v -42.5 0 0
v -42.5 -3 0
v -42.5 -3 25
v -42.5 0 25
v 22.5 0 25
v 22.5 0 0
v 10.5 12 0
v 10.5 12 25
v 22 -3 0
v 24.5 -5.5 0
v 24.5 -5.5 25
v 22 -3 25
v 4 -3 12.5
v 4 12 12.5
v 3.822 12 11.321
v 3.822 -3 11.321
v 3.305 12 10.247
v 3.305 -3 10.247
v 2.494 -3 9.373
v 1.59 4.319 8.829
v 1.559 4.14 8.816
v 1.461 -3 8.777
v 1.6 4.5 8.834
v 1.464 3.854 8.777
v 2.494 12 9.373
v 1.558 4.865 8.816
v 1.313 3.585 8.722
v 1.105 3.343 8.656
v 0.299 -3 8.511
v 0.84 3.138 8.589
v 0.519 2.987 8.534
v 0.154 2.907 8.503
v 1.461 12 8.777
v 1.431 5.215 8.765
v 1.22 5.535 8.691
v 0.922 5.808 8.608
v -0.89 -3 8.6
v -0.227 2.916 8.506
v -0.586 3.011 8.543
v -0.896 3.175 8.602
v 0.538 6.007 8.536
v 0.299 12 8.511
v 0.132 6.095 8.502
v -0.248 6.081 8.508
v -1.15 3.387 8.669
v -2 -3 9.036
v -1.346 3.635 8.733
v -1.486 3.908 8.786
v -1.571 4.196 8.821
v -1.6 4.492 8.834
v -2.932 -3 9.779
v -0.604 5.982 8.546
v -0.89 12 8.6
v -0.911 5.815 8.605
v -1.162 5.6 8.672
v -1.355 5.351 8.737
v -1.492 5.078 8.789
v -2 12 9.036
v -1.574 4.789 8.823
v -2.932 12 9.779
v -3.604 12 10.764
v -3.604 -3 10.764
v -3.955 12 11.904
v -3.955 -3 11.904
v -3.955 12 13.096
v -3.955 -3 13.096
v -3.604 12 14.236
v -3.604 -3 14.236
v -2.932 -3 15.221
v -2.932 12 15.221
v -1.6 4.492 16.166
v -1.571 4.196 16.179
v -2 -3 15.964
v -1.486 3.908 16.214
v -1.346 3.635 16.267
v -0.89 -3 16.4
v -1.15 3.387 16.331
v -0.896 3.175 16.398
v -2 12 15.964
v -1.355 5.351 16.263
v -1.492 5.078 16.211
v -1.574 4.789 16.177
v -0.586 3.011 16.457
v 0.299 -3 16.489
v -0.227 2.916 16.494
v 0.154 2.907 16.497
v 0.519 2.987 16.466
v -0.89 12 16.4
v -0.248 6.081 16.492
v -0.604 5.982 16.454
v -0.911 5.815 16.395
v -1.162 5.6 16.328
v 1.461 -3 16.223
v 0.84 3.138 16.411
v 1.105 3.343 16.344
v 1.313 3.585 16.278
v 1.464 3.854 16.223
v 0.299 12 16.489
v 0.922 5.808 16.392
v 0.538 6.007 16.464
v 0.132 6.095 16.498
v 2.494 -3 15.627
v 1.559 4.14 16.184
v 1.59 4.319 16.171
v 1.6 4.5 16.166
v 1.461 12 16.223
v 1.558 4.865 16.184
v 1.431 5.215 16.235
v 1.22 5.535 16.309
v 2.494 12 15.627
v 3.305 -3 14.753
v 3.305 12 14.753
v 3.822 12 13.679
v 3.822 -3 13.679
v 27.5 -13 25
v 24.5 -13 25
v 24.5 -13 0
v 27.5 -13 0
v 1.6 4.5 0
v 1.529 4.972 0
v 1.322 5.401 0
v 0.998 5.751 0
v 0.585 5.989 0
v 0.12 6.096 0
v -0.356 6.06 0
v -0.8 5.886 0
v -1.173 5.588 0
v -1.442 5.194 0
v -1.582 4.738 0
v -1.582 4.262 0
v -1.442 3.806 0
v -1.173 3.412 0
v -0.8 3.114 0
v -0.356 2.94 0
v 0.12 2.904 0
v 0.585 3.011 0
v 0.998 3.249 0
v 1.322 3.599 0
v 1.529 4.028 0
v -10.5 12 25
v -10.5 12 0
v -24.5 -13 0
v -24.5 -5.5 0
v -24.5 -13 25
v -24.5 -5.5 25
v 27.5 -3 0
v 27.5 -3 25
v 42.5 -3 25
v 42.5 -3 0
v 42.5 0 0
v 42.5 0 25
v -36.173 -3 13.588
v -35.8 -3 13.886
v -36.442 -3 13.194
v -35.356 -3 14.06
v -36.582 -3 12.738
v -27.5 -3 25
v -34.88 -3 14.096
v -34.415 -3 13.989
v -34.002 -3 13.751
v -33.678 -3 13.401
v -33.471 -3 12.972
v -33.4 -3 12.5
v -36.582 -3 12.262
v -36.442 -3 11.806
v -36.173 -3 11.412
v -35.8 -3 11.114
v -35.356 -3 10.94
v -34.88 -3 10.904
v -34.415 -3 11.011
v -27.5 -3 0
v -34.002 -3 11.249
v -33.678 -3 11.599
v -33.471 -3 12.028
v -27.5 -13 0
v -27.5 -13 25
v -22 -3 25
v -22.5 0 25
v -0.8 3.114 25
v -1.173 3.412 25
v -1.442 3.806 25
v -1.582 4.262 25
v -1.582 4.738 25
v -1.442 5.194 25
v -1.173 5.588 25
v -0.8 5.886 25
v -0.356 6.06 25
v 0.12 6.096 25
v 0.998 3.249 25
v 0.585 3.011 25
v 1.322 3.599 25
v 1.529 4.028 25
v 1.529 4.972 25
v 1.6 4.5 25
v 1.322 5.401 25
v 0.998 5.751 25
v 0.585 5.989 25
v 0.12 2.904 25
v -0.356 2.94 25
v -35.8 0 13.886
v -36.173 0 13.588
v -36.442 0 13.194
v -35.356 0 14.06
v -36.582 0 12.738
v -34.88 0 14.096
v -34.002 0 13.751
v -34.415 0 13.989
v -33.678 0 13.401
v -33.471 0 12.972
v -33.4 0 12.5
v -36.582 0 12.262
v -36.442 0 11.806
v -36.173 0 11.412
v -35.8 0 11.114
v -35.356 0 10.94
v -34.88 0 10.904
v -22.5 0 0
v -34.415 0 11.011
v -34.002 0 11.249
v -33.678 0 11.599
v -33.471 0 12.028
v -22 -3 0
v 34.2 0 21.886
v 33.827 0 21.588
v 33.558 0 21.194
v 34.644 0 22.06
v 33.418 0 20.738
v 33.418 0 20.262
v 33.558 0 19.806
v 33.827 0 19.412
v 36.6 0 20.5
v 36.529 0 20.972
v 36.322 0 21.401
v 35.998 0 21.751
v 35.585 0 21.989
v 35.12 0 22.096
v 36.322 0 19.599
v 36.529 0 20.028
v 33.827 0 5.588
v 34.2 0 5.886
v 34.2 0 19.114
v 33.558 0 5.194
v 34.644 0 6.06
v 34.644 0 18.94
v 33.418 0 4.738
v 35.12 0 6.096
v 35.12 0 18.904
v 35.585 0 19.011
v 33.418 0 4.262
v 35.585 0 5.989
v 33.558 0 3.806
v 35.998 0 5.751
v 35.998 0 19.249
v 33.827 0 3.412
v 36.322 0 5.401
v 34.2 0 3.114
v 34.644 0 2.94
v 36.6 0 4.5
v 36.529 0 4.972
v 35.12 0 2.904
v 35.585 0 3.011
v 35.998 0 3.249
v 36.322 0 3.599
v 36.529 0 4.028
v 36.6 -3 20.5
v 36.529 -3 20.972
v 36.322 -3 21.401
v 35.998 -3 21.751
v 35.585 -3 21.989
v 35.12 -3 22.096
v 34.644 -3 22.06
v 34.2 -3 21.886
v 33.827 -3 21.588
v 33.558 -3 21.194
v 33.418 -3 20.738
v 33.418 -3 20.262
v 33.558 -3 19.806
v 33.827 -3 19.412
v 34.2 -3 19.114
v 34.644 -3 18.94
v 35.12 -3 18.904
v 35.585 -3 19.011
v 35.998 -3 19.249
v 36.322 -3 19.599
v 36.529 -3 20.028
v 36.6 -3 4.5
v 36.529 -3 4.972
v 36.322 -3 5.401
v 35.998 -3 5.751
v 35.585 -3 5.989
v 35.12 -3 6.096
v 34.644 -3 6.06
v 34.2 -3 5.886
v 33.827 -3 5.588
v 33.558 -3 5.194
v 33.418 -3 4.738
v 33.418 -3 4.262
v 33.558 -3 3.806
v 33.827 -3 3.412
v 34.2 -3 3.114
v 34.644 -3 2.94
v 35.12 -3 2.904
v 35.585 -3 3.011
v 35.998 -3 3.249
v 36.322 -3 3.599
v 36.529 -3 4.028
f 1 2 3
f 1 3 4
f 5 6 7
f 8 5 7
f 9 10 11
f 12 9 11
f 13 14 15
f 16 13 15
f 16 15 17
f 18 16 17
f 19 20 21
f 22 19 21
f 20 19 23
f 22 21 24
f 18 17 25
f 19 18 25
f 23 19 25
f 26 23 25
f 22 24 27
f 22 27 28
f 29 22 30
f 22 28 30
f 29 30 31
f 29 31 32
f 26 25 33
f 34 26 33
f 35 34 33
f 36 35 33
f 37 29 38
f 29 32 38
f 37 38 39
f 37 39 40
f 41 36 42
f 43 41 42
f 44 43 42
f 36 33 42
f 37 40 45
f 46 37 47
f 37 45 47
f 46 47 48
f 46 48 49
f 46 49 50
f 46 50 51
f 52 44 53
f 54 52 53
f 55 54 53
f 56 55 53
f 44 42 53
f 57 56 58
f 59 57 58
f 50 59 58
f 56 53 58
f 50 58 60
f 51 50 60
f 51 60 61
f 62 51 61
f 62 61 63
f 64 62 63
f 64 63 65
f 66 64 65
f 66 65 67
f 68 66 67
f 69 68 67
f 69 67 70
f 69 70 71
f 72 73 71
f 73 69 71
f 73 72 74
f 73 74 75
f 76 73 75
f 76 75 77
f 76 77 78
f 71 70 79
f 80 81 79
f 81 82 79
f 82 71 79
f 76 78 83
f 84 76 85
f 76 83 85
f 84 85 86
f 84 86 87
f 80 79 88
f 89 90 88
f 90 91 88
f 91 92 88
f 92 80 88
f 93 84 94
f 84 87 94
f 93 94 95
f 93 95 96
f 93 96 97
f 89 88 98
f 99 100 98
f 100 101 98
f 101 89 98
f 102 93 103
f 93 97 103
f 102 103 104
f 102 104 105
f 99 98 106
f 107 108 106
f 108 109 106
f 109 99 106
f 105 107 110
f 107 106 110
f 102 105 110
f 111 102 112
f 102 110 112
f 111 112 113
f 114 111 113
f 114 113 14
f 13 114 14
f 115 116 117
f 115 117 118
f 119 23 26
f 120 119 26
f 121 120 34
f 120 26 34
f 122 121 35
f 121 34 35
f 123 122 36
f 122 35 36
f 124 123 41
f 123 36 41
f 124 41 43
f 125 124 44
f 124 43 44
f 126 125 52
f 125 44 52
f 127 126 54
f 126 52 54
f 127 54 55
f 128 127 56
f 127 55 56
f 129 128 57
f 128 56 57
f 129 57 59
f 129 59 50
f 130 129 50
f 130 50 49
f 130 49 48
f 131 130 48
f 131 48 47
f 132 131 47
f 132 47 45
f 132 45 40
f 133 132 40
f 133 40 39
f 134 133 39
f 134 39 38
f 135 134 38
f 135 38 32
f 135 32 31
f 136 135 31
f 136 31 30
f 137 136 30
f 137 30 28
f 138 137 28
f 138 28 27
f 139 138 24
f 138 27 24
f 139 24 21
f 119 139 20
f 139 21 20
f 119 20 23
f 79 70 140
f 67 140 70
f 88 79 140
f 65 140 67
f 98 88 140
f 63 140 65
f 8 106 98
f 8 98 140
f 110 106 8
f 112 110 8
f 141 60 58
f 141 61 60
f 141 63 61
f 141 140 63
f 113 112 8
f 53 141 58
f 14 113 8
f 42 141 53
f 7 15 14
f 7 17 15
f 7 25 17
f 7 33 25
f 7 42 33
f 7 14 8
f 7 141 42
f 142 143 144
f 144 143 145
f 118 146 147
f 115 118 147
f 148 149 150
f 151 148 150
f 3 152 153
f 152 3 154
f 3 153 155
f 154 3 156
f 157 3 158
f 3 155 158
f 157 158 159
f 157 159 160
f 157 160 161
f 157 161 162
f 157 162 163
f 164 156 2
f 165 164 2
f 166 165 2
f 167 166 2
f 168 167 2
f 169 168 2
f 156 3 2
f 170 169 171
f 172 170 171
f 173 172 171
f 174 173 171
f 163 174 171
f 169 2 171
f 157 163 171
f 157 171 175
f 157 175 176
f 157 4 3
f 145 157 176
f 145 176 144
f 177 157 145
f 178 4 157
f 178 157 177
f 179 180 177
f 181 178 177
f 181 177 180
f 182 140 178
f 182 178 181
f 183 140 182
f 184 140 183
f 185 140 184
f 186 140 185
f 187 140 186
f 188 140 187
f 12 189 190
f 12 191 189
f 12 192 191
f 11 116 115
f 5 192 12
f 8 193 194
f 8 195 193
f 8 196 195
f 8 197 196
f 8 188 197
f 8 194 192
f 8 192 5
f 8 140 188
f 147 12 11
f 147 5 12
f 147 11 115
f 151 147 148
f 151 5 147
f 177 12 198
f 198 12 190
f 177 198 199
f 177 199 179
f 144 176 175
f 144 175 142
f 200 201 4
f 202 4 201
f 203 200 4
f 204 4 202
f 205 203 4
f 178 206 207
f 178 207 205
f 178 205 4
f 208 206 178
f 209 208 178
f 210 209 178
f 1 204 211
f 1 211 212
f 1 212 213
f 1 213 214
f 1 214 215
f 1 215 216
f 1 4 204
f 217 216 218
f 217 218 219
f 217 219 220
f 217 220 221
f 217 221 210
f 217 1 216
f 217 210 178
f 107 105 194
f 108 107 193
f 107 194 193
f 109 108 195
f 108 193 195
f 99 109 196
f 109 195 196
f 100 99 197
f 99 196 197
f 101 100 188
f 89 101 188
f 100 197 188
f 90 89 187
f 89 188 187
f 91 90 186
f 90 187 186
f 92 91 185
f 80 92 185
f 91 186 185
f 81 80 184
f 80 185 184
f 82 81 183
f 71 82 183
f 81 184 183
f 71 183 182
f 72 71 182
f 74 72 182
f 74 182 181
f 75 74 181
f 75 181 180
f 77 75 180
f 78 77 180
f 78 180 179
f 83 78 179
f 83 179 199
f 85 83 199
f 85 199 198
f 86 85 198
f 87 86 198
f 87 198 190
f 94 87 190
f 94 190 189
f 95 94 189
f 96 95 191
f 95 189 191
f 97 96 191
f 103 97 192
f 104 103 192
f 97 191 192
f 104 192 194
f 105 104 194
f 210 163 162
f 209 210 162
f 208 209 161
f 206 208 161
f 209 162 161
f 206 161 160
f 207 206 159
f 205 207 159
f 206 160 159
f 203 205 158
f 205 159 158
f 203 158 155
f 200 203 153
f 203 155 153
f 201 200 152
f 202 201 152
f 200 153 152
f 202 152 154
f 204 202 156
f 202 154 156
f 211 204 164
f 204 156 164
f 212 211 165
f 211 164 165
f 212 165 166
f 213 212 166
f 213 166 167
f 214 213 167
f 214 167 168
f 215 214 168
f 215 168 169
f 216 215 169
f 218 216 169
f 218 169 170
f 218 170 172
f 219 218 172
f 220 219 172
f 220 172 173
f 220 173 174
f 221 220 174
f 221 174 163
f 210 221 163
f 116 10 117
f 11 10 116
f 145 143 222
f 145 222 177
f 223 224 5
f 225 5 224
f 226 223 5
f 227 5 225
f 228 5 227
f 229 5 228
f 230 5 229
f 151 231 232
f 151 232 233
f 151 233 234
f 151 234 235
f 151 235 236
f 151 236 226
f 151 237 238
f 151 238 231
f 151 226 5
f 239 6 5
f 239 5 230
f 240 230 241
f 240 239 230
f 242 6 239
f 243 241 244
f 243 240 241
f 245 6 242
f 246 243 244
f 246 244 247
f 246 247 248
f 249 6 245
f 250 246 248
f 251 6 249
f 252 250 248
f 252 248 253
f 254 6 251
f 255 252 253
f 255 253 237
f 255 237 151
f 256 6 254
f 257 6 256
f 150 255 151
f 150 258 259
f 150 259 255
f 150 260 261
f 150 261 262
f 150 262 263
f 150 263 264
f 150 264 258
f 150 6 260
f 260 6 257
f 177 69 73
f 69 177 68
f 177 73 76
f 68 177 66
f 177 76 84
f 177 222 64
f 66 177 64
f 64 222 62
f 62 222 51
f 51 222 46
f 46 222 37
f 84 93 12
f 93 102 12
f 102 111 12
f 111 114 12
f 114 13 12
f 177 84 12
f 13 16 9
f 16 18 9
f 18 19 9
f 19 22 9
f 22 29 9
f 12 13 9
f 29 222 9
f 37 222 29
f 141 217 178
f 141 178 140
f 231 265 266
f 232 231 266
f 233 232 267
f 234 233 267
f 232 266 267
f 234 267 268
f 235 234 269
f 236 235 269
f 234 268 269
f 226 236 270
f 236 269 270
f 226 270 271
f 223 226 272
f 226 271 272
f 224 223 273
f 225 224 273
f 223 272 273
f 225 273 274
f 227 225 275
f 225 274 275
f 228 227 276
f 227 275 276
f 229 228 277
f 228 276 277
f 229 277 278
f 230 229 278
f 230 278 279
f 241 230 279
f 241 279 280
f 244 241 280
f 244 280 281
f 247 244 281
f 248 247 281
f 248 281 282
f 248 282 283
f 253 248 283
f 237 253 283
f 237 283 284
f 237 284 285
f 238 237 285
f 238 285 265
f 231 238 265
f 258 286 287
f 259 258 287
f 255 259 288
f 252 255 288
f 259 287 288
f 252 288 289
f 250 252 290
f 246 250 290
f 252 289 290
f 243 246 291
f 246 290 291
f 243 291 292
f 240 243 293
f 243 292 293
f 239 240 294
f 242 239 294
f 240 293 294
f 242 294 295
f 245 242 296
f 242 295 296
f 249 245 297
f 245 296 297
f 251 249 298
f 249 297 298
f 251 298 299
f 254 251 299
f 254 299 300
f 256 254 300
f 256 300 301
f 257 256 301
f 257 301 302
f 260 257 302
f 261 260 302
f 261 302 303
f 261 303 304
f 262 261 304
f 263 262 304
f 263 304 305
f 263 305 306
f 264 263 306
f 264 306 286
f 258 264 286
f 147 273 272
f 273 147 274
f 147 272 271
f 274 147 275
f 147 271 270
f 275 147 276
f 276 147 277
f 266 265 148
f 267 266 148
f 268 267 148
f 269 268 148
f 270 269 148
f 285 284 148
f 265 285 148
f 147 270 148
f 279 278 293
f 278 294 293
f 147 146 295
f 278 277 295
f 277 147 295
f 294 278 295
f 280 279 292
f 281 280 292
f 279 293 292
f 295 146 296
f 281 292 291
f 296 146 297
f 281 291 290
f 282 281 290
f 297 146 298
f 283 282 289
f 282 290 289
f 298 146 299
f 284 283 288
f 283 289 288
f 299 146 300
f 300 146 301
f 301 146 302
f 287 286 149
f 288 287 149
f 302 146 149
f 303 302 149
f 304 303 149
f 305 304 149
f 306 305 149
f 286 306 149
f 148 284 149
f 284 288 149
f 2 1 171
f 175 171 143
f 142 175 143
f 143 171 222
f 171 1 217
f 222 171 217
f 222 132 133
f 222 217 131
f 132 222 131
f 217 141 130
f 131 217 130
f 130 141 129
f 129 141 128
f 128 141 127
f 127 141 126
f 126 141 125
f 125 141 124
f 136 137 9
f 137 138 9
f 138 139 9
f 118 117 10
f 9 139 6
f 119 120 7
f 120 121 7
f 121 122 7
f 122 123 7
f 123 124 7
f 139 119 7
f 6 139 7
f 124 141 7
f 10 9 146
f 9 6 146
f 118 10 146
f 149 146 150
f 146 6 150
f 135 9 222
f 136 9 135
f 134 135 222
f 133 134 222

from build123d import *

# Parameters (mm, degrees)
SKETCH_1_W          = 85
SKETCH_1_H          = 3
EXTRUDE_1_DEPTH     = 25
SKETCH_2_W          = 3
SKETCH_2_H          = 25
EXTRUDE_2_DEPTH     = 10
SKETCH_3_W          = 3
SKETCH_3_H          = 25
EXTRUDE_3_DEPTH     = 10
SKETCH_4_W          = 25
SKETCH_4_H          = 25
EXTRUDE_1_2_DEPTH   = 12
CUT_EXTRUDE_1_REACH = 27
SKETCH_5_R          = 4
CHAMFER_1_SIZE      = 10
CHAMFER_2_SIZE      = 10
CUT_EXTRUDE_3_REACH = 27
CUT_EXTRUDE_4_REACH = 17
SKETCH_8_R          = 1.6
CHAMFER_4_SIZE      = 2.5
CHAMFER_5_SIZE      = 2.5
SKETCH_9_R          = 1.6
CUT_EXTRUDE_5_DEPTH = 25


with BuildPart() as part:
    # 草图1 → Extrude 1 (new body)
    with BuildSketch(Plane.XY):
        with Locations((0, -1.5)):
            Rectangle(SKETCH_1_W, SKETCH_1_H)
    extrude(amount=EXTRUDE_1_DEPTH)

    # 草图2 → 拉伸-薄壁2 (add)
    with BuildSketch(Plane.XZ.offset(3)):
        with Locations((-26, 12.5)):
            Rectangle(SKETCH_2_W, SKETCH_2_H)
    extrude(amount=EXTRUDE_2_DEPTH)

    # 草图3 → 拉伸-薄壁3 (add)
    with BuildSketch(Plane.XZ.offset(3)):
        with Locations((26, 12.5)):
            Rectangle(SKETCH_3_W, SKETCH_3_H)
    extrude(amount=EXTRUDE_3_DEPTH)

    # 草图4 → Extrude 1 2 (add)
    with BuildSketch(Plane(origin=(0, 0, 0), x_dir=(1, 0, 0), z_dir=(0, 1, 0))):
        with Locations((0, -12.5)):
            Rectangle(SKETCH_4_W, SKETCH_4_H)
    extrude(amount=EXTRUDE_1_2_DEPTH)

    # 草图5 → 切除-拉伸1 (cut, up to next)
    with BuildSketch(Plane(origin=(0, 12, 0), x_dir=(1, 0, 0), z_dir=(0, 1, 0)), mode=Mode.PRIVATE) as cut_extrude_1_sk1:
        with Locations((0, -12.5)):
            Circle(SKETCH_5_R)
    cut_extrude_1_tool1 = extrude(cut_extrude_1_sk1.sketch, amount=-CUT_EXTRUDE_1_REACH, mode=Mode.PRIVATE) & part.part
    add(cut_extrude_1_tool1.solids().sort_by_distance((0, 12, 12.5))[0], mode=Mode.SUBTRACT)

    # 倒角1
    chamfer_1_edges = [part.edges().sort_by_distance(p)[0] for p in [
        (12.5, 0, 12.5),
    ]]
    chamfer(chamfer_1_edges, length=CHAMFER_1_SIZE)

    # 倒角2
    chamfer_2_edges = [part.edges().sort_by_distance(p)[0] for p in [
        (-12.5, 0, 12.5),
    ]]
    chamfer(chamfer_2_edges, length=CHAMFER_2_SIZE)

    # 草图7 → 切除-拉伸3 (cut, up to next)
    with BuildSketch(Plane(origin=(0, 0, 0), x_dir=(-1, 0, 0), z_dir=(0, 0, -1)), mode=Mode.PRIVATE) as cut_extrude_3_sk1:
        Polygon((-12.5, 10), (-10.5, 12), (-12.5, 12), align=None)
    cut_extrude_3_tool1 = extrude(cut_extrude_3_sk1.sketch, amount=-CUT_EXTRUDE_3_REACH, mode=Mode.PRIVATE) & part.part
    add(cut_extrude_3_tool1.solids().sort_by_distance((11.833333, 11.333333, 0))[0], mode=Mode.SUBTRACT)
    # 草图7 → 切除-拉伸3 (cut, up to next)
    with BuildSketch(Plane(origin=(0, 0, 0), x_dir=(-1, 0, 0), z_dir=(0, 0, -1)), mode=Mode.PRIVATE) as cut_extrude_3_sk2:
        Polygon((12.5, 10), (10.5, 12), (12.5, 12), align=None)
    cut_extrude_3_tool2 = extrude(cut_extrude_3_sk2.sketch, amount=-CUT_EXTRUDE_3_REACH, mode=Mode.PRIVATE) & part.part
    add(cut_extrude_3_tool2.solids().sort_by_distance((-11.833333, 11.333333, 0))[0], mode=Mode.SUBTRACT)

    # 草图8 → 切除-拉伸4 (cut, up to next)
    with BuildSketch(Plane.XZ.offset(3), mode=Mode.PRIVATE) as cut_extrude_4_sk1:
        with Locations((35, 4.5)):
            Circle(SKETCH_8_R)
    cut_extrude_4_tool1 = extrude(cut_extrude_4_sk1.sketch, amount=-CUT_EXTRUDE_4_REACH, mode=Mode.PRIVATE) & part.part
    add(cut_extrude_4_tool1.solids().sort_by_distance((35, -3, 4.5))[0], mode=Mode.SUBTRACT)
    # 草图8 → 切除-拉伸4 (cut, up to next)
    with BuildSketch(Plane.XZ.offset(3), mode=Mode.PRIVATE) as cut_extrude_4_sk2:
        with Locations((35, 20.5)):
            Circle(SKETCH_8_R)
    cut_extrude_4_tool2 = extrude(cut_extrude_4_sk2.sketch, amount=-CUT_EXTRUDE_4_REACH, mode=Mode.PRIVATE) & part.part
    add(cut_extrude_4_tool2.solids().sort_by_distance((35, -3, 20.5))[0], mode=Mode.SUBTRACT)
    # 草图8 → 切除-拉伸4 (cut, up to next)
    with BuildSketch(Plane.XZ.offset(3), mode=Mode.PRIVATE) as cut_extrude_4_sk3:
        with Locations((-35, 12.5)):
            Circle(SKETCH_8_R)
    cut_extrude_4_tool3 = extrude(cut_extrude_4_sk3.sketch, amount=-CUT_EXTRUDE_4_REACH, mode=Mode.PRIVATE) & part.part
    add(cut_extrude_4_tool3.solids().sort_by_distance((-35, -3, 12.5))[0], mode=Mode.SUBTRACT)

    # 倒角4
    chamfer_4_edges = [part.edges().sort_by_distance(p)[0] for p in [
        (24.5, -3, 12.5),
    ]]
    chamfer(chamfer_4_edges, length=CHAMFER_4_SIZE)

    # 倒角5
    chamfer_5_edges = [part.edges().sort_by_distance(p)[0] for p in [
        (-24.5, -3, 12.5),
    ]]
    chamfer(chamfer_5_edges, length=CHAMFER_5_SIZE)

    # 草图9 → 切除-拉伸5 (cut)
    with BuildSketch(Plane.XY.offset(25)):
        with Locations((0, 4.5)):
            Circle(SKETCH_9_R)
    extrude(amount=-CUT_EXTRUDE_5_DEPTH, mode=Mode.SUBTRACT)


solid = part.part
